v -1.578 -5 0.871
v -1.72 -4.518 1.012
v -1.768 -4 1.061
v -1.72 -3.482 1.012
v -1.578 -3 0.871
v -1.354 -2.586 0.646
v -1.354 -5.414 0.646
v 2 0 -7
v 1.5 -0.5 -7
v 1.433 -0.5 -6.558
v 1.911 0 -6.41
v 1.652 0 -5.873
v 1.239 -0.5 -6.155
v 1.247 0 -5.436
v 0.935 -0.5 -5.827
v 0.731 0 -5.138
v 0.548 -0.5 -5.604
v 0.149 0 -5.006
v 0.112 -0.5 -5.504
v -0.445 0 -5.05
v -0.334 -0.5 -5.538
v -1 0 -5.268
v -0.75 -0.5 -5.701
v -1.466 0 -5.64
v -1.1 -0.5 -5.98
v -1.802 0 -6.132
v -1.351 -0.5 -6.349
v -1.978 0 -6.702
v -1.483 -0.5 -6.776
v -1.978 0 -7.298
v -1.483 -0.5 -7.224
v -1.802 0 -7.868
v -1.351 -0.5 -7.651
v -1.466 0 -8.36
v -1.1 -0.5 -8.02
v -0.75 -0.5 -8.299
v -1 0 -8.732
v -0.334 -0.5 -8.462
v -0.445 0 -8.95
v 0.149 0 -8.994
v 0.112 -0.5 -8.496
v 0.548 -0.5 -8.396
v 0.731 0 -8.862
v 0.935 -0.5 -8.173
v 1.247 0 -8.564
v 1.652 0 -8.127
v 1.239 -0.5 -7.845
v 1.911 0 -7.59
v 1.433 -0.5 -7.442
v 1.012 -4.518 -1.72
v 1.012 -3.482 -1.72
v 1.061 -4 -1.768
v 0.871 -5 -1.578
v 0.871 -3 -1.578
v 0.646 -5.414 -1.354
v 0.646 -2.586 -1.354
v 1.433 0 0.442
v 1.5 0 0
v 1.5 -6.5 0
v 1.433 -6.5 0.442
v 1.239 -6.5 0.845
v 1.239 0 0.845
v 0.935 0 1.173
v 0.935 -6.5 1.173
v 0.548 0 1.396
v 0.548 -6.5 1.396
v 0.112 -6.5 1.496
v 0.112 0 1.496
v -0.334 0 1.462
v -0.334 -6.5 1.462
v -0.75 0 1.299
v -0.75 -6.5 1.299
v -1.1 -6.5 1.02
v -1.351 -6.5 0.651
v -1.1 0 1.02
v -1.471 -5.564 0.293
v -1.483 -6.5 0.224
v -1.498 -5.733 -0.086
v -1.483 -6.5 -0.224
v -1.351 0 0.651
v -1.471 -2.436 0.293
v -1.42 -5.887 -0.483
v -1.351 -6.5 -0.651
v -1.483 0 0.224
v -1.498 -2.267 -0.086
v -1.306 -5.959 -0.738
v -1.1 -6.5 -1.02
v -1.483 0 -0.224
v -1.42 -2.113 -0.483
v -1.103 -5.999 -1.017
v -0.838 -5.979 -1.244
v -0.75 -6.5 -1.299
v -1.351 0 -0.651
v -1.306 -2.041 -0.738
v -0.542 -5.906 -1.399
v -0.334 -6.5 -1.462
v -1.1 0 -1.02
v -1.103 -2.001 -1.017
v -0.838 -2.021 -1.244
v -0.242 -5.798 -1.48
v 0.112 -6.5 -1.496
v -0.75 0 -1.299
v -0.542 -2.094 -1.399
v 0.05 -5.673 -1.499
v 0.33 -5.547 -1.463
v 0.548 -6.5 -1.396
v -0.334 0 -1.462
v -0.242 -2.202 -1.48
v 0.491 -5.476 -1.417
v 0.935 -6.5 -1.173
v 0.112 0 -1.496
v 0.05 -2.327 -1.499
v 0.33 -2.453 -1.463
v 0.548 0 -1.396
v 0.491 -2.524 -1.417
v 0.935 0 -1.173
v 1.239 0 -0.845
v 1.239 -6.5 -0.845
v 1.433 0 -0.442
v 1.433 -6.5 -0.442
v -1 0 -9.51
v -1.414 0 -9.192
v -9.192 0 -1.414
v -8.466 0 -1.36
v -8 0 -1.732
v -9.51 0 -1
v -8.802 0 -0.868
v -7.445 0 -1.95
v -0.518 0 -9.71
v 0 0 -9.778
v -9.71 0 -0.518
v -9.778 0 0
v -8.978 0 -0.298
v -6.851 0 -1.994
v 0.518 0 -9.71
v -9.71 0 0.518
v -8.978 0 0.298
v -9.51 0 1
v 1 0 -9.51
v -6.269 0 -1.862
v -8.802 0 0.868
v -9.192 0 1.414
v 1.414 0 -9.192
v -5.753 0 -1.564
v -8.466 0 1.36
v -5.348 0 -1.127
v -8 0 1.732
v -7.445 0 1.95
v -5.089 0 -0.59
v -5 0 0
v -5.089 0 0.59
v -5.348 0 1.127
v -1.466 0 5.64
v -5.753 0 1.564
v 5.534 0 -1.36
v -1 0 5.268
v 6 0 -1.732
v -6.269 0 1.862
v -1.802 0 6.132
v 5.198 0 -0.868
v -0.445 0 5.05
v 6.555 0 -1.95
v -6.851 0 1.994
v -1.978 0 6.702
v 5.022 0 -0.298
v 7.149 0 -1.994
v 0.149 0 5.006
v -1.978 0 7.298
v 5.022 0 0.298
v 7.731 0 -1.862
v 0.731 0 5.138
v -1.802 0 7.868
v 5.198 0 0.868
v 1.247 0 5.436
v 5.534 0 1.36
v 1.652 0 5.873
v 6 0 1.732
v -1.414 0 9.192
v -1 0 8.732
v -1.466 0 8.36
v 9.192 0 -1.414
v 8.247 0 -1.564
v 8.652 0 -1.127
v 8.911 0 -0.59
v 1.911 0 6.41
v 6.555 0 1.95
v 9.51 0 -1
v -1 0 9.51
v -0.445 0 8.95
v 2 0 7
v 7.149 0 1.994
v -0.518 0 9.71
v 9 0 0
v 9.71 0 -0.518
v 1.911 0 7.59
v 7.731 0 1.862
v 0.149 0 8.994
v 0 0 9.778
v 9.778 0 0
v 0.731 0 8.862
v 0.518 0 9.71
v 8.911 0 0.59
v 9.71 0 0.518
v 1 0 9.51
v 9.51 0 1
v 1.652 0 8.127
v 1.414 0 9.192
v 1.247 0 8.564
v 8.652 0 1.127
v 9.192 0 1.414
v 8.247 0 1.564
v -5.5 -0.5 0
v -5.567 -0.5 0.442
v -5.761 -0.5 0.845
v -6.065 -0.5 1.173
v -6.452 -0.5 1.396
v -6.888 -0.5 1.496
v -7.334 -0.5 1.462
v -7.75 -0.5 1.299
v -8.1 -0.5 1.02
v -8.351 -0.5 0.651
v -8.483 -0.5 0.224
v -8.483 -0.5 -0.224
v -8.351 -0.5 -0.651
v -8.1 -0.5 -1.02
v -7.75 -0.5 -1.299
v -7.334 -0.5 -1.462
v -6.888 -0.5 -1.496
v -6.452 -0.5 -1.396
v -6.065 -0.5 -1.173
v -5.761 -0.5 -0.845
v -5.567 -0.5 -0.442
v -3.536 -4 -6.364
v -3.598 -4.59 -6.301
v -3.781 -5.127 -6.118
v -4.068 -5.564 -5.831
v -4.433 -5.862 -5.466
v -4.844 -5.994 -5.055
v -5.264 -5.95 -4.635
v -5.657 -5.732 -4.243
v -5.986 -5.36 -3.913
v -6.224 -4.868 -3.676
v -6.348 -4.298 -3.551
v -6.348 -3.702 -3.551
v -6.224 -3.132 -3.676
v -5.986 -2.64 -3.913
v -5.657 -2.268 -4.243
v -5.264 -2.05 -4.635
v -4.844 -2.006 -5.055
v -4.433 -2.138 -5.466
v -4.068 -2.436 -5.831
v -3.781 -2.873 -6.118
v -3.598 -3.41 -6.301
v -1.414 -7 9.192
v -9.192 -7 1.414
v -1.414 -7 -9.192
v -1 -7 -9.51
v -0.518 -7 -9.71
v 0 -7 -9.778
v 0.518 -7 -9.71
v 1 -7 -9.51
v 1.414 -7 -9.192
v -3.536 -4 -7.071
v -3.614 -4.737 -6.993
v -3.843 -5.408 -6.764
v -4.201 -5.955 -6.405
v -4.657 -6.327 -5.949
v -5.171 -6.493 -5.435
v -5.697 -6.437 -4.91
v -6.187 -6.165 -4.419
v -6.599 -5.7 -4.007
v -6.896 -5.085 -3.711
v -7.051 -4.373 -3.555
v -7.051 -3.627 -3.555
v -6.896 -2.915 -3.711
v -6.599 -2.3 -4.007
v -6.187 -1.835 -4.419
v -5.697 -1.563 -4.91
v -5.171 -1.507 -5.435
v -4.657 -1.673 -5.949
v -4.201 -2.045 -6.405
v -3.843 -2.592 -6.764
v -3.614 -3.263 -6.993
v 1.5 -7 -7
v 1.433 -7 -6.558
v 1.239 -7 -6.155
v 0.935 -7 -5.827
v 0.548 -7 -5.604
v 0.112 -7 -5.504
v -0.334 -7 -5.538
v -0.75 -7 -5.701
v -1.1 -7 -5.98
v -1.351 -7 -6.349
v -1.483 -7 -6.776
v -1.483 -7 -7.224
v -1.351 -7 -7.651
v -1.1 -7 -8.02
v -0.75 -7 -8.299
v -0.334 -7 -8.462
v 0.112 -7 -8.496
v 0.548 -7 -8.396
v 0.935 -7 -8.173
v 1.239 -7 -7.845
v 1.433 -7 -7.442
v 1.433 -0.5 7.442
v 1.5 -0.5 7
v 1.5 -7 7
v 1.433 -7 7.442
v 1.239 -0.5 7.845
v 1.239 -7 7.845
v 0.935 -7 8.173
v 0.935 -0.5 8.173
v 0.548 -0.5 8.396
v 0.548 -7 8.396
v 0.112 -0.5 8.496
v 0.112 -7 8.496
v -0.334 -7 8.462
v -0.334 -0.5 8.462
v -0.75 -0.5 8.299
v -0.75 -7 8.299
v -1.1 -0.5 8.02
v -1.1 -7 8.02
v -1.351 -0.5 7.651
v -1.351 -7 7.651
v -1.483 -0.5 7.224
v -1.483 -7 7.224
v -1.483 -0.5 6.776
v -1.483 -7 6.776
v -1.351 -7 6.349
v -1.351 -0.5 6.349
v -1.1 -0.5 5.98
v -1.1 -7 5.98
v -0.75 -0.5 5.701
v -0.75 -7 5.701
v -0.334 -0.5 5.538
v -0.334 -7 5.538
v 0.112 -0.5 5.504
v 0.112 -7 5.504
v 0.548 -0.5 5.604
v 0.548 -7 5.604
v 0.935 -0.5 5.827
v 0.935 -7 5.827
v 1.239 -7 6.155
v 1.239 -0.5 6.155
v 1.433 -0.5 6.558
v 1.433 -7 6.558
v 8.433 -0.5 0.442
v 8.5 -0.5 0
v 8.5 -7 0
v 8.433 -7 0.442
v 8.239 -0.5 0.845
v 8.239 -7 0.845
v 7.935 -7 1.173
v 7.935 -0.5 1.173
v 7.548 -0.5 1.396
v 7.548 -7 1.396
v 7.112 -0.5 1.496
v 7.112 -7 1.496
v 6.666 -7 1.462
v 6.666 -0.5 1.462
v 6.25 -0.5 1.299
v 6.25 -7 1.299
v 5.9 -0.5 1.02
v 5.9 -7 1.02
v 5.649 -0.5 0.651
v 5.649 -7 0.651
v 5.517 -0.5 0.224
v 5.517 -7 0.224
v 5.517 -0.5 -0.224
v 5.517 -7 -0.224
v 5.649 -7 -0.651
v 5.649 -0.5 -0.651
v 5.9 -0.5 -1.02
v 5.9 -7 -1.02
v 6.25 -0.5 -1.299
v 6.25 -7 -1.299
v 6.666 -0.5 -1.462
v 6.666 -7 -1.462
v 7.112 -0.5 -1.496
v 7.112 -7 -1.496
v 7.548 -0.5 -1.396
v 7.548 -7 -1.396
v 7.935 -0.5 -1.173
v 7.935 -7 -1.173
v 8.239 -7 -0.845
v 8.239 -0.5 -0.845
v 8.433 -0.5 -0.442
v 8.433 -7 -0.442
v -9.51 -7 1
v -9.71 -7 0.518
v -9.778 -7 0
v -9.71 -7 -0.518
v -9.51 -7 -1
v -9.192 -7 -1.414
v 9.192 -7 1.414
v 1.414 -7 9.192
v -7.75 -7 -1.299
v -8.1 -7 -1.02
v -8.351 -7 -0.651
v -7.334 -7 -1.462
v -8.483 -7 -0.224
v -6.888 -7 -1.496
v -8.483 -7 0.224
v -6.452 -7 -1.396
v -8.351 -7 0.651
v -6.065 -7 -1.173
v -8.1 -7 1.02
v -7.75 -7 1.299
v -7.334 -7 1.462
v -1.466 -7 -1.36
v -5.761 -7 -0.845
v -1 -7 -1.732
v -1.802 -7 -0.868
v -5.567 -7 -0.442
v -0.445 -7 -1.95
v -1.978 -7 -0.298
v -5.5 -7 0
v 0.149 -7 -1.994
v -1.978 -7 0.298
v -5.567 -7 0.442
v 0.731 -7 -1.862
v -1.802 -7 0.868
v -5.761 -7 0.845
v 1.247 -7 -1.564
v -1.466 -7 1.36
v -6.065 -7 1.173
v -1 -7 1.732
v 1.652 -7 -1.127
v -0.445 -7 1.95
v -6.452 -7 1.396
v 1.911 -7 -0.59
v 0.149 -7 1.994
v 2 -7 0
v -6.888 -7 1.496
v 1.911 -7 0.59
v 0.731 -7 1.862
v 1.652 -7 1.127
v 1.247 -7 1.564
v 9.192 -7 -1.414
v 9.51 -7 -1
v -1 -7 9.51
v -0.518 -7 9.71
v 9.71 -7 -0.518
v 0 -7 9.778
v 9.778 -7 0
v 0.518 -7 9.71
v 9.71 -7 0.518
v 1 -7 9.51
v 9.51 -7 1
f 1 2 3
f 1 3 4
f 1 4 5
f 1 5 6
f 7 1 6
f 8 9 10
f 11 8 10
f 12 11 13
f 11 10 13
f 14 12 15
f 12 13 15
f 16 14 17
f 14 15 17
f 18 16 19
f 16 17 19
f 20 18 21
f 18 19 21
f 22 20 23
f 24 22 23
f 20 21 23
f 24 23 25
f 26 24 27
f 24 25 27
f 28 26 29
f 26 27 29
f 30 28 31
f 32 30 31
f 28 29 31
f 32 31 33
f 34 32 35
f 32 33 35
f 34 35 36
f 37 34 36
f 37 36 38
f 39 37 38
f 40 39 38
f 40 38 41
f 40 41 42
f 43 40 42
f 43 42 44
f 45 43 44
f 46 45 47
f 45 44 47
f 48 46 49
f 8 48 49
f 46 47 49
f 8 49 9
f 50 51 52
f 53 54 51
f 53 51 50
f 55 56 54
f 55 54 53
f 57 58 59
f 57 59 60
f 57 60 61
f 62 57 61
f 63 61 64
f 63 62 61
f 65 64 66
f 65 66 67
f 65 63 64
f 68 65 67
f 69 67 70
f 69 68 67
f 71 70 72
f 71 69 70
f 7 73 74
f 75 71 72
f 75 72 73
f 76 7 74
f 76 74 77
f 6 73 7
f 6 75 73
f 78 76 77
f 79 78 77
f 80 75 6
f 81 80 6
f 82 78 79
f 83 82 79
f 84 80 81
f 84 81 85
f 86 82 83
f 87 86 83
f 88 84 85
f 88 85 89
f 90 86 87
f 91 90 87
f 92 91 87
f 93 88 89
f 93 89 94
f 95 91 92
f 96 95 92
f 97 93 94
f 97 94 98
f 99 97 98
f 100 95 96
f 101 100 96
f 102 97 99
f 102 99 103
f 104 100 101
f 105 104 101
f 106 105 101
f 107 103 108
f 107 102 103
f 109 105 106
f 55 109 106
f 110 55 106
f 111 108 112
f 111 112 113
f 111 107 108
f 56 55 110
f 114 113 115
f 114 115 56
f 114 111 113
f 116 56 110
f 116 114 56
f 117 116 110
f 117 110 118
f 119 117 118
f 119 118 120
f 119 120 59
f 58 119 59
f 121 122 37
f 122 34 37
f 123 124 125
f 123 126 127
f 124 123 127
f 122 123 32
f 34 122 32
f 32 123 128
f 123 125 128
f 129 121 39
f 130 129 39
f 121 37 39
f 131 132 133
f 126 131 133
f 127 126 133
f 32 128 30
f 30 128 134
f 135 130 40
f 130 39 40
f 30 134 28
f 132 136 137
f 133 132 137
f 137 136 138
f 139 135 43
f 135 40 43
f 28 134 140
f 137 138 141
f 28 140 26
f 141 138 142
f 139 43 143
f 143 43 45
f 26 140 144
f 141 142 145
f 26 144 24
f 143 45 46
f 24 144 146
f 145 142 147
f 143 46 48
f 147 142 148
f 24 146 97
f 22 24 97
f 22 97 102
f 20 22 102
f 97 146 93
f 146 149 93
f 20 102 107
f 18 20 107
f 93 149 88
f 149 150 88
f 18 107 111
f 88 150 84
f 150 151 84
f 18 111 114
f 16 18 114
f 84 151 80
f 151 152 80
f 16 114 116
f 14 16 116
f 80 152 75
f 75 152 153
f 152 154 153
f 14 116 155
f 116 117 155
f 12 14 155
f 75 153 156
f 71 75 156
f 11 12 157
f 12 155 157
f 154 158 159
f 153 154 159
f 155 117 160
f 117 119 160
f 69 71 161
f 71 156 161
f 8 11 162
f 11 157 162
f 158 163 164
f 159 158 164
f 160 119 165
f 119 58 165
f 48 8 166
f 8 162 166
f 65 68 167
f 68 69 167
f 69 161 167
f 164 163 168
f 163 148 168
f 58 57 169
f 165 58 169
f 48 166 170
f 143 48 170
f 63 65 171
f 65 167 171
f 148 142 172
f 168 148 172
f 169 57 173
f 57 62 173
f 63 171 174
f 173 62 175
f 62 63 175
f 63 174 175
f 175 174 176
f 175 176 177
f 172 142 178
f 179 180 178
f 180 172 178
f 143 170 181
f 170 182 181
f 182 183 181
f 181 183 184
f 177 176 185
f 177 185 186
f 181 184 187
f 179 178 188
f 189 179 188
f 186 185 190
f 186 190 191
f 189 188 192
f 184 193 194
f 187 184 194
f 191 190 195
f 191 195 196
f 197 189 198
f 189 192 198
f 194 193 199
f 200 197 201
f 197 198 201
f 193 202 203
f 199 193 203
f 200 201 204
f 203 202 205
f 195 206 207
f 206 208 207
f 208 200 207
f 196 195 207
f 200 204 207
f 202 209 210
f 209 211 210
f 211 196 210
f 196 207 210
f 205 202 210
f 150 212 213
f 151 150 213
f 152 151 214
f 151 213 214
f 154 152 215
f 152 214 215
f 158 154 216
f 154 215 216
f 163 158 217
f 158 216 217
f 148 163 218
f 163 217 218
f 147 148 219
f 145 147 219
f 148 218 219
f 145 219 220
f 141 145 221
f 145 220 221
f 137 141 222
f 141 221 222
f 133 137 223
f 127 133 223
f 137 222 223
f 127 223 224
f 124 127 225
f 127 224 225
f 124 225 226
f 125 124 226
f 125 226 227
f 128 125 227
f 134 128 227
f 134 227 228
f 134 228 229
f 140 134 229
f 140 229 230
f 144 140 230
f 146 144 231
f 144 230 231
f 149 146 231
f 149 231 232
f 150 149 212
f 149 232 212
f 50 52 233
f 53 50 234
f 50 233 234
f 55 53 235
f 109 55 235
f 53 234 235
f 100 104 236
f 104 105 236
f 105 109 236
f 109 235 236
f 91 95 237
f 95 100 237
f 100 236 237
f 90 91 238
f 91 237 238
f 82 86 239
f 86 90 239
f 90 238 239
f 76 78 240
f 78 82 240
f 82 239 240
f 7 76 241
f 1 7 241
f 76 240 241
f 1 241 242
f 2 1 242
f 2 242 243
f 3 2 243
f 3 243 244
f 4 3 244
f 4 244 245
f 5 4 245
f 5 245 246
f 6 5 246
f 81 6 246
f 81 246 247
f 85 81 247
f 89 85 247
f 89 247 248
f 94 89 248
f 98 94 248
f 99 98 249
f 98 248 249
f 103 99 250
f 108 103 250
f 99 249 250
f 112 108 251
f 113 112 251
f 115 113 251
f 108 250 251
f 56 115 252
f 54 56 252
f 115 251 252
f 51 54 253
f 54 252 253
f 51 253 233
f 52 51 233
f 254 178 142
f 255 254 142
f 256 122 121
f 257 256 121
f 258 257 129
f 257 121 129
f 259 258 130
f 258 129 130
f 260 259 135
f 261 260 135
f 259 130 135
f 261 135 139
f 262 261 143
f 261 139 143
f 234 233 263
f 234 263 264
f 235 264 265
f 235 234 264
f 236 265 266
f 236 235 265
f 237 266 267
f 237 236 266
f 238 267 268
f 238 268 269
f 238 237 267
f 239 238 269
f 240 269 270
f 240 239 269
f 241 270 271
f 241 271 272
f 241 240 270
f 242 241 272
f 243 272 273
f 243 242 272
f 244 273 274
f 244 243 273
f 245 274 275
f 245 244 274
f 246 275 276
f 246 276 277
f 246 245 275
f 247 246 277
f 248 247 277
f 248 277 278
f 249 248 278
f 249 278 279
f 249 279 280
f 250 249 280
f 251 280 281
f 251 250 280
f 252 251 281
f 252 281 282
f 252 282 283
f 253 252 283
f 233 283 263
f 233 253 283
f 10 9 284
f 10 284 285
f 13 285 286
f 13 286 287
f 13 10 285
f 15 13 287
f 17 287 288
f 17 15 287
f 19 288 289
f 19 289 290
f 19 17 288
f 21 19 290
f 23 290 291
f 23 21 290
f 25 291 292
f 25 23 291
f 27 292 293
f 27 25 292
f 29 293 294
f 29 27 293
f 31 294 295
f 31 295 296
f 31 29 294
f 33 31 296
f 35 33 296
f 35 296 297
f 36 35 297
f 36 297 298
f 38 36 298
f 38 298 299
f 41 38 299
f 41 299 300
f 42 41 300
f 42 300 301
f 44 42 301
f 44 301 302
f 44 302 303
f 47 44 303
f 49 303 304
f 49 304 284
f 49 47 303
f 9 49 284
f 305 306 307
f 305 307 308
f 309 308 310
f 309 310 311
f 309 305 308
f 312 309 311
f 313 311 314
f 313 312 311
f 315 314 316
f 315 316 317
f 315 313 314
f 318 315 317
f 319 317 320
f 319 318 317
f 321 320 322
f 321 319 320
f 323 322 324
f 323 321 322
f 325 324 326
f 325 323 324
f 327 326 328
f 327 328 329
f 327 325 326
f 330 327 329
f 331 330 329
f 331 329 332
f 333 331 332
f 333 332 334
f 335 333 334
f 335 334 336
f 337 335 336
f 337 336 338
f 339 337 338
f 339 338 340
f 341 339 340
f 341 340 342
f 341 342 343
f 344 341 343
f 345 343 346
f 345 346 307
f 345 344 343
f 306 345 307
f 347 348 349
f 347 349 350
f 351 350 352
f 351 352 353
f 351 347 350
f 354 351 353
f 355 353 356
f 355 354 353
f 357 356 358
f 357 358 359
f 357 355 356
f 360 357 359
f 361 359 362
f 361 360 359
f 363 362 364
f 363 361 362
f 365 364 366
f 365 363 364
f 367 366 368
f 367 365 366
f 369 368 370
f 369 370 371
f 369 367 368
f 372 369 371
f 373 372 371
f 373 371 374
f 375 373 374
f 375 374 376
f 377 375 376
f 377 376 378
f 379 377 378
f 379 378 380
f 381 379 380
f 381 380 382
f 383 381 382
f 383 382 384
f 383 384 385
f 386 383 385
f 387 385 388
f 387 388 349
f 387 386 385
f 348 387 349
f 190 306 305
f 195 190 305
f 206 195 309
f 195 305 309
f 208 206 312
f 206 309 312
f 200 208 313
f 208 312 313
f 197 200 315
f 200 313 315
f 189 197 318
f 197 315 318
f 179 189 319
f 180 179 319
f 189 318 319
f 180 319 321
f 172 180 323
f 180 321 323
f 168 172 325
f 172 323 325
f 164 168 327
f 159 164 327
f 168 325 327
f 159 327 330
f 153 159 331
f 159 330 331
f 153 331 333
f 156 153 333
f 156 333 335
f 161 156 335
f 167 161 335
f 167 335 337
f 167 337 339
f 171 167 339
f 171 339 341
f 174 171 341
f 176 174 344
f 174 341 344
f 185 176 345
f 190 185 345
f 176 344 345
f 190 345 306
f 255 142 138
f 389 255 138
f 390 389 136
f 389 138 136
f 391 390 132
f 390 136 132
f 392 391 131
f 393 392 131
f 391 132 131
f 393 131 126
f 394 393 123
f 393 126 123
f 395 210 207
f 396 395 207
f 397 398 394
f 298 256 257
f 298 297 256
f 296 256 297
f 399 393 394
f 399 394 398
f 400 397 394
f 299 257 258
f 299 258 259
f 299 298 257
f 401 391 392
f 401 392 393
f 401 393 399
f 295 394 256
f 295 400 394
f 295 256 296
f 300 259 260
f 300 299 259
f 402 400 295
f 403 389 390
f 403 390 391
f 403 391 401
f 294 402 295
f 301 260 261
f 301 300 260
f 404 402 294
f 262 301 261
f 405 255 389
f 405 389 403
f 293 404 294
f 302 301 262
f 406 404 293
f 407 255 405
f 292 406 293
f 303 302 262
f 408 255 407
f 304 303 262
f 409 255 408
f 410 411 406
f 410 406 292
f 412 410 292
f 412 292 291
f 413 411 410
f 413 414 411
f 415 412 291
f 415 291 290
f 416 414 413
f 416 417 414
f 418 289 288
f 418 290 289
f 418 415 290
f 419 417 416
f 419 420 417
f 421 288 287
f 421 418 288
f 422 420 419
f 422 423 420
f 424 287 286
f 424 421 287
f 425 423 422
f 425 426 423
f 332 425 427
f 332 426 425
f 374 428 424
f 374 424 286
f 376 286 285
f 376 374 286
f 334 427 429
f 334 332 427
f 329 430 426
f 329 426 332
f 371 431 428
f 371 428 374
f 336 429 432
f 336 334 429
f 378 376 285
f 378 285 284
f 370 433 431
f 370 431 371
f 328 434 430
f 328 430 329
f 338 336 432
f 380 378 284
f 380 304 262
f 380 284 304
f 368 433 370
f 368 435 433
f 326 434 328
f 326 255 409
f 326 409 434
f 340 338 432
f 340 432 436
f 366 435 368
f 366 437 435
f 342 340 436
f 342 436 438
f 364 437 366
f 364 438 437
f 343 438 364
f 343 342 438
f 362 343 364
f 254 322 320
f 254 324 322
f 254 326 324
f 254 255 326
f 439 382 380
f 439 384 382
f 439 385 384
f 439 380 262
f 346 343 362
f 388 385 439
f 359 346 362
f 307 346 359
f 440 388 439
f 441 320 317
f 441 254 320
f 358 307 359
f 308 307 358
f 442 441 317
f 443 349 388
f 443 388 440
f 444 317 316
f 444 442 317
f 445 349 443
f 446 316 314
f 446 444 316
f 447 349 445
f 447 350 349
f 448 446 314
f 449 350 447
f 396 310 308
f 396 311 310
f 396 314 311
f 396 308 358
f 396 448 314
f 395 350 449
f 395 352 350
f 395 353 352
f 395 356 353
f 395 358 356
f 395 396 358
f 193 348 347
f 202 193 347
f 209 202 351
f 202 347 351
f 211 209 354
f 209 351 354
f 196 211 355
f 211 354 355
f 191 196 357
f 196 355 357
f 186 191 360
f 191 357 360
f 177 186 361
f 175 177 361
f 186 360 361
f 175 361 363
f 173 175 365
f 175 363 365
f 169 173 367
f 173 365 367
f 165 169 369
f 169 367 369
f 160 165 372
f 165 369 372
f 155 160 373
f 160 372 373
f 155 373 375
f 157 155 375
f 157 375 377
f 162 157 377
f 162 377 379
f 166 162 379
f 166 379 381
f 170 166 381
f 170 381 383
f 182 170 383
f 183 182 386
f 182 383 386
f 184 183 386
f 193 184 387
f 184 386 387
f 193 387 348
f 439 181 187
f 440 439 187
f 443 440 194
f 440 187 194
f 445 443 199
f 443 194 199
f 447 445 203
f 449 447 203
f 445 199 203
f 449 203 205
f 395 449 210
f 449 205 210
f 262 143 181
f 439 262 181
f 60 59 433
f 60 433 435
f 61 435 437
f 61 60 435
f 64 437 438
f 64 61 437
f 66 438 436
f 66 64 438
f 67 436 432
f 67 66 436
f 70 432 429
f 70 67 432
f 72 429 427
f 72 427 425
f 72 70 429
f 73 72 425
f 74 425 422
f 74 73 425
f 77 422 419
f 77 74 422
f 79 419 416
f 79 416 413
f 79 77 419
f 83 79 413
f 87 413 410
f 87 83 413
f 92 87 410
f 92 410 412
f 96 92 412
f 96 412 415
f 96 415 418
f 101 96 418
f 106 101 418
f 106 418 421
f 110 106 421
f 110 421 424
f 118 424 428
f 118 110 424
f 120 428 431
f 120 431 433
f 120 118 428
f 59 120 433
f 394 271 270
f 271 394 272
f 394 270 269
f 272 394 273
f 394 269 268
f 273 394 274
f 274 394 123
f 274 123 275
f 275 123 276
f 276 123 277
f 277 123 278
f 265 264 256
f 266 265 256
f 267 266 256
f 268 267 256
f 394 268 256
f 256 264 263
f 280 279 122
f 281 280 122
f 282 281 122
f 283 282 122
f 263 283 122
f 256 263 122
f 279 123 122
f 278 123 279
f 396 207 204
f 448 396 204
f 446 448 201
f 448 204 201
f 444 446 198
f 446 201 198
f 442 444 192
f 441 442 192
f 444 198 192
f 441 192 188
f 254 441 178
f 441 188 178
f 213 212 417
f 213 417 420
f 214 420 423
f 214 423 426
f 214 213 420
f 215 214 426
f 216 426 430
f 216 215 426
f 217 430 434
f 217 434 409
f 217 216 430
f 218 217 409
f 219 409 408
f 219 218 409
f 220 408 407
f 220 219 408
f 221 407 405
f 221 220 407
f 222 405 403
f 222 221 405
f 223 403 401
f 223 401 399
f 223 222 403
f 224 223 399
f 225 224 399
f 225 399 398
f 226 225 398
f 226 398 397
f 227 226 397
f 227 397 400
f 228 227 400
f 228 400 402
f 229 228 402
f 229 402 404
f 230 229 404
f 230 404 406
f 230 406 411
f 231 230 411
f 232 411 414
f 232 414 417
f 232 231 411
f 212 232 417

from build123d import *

# Parameters (mm, degrees)
F0_R     = 1.5
F1_DEPTH = 7
F2_R     = 2
F3_DEPTH = 7
F4_SIZE  = 0.5


with BuildPart() as f1:
    # F0 (on Front) → F1 (new body)
    with BuildSketch(Plane.XZ):
        with BuildLine():
            Line((-9.192388, -1.414214), (-1.414214, -9.192388))
            ThreePointArc((-1.414214, -9.192388), (0, -9.778175), (1.414214, -9.192388))
            Line((1.414214, -9.192388), (9.192388, -1.414214))
            ThreePointArc((9.192388, -1.414214), (9.778175, 0), (9.192388, 1.414214))
            Line((9.192388, 1.414214), (1.414214, 9.192388))
            ThreePointArc((1.414214, 9.192388), (0, 9.778175), (-1.414214, 9.192388))
            Line((-1.414214, 9.192388), (-9.192388, 1.414214))
            ThreePointArc((-9.192388, 1.414214), (-9.778175, 0), (-9.192388, -1.414214))
        make_face()
        with Locations((0, -7)):
            Circle(F0_R, mode=Mode.SUBTRACT)
        with Locations((-7, 0)):
            Circle(F0_R, mode=Mode.SUBTRACT)
        Circle(F0_R, mode=Mode.SUBTRACT)
        with Locations((7, 0)):
            Circle(F0_R, mode=Mode.SUBTRACT)
        with Locations((0, 7)):
            Circle(F0_R, mode=Mode.SUBTRACT)
    extrude(amount=F1_DEPTH)

    # F2 (on face) → F3 (cut)
    with BuildSketch(Plane(origin=(-5.303301, 0, -5.303301), x_dir=(0.707107, 0, -0.707107), z_dir=(-0.707107, 0, -0.707107))):
        with Locations((0, 4)):
            Circle(F2_R)
    extrude(amount=-F3_DEPTH, mode=Mode.SUBTRACT)

    # F4
    f4_edges = [f1.edges().sort_by_distance(p)[0] for p in [
        (-1.5, 0, 7),
        (-8.5, 0, 0),
        (-1.5, 0, -7),
        (5.5, 0, 0),
        (-1.5, -7, 0),
        (-6.717514, -4, -3.889087),
    ]]
    chamfer(f4_edges, length=F4_SIZE)


solid = f1.part
